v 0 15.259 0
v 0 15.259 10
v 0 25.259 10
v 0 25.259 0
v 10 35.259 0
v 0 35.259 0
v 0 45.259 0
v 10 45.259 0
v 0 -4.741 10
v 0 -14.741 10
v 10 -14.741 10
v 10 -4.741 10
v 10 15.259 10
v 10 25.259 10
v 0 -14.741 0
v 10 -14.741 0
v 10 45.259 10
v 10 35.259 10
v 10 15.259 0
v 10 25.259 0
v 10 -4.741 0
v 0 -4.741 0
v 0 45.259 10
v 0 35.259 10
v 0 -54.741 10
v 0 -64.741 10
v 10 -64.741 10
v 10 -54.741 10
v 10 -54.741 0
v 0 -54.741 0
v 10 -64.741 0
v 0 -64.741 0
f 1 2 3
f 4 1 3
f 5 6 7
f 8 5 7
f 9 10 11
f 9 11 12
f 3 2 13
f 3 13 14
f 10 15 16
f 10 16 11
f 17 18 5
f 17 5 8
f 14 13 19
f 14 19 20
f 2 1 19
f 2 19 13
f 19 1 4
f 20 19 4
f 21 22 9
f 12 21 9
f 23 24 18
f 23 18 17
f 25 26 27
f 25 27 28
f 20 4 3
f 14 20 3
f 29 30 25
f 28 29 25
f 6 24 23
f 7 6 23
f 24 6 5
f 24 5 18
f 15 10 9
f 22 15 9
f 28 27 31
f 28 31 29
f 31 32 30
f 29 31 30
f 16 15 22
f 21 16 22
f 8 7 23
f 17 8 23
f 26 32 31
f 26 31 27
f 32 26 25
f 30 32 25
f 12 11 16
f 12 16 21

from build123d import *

# Parameters (mm, degrees)
F0_W     = 10
F0_H     = 10
F1_DEPTH = 10


with BuildPart() as f1:
    # F0 (on Right) → F1 (new body)
    with BuildSketch(Plane.YZ):
        with Locations((-59.741457, 5)):
            Rectangle(F0_W, F0_H)
        with Locations((-9.741457, 5)):
            Rectangle(F0_W, F0_H)
        with Locations((20.258543, 5)):
            Rectangle(F0_W, F0_H)
        with Locations((40.258543, 5)):
            Rectangle(F0_W, F0_H)
    extrude(amount=F1_DEPTH)


solid = f1.part
